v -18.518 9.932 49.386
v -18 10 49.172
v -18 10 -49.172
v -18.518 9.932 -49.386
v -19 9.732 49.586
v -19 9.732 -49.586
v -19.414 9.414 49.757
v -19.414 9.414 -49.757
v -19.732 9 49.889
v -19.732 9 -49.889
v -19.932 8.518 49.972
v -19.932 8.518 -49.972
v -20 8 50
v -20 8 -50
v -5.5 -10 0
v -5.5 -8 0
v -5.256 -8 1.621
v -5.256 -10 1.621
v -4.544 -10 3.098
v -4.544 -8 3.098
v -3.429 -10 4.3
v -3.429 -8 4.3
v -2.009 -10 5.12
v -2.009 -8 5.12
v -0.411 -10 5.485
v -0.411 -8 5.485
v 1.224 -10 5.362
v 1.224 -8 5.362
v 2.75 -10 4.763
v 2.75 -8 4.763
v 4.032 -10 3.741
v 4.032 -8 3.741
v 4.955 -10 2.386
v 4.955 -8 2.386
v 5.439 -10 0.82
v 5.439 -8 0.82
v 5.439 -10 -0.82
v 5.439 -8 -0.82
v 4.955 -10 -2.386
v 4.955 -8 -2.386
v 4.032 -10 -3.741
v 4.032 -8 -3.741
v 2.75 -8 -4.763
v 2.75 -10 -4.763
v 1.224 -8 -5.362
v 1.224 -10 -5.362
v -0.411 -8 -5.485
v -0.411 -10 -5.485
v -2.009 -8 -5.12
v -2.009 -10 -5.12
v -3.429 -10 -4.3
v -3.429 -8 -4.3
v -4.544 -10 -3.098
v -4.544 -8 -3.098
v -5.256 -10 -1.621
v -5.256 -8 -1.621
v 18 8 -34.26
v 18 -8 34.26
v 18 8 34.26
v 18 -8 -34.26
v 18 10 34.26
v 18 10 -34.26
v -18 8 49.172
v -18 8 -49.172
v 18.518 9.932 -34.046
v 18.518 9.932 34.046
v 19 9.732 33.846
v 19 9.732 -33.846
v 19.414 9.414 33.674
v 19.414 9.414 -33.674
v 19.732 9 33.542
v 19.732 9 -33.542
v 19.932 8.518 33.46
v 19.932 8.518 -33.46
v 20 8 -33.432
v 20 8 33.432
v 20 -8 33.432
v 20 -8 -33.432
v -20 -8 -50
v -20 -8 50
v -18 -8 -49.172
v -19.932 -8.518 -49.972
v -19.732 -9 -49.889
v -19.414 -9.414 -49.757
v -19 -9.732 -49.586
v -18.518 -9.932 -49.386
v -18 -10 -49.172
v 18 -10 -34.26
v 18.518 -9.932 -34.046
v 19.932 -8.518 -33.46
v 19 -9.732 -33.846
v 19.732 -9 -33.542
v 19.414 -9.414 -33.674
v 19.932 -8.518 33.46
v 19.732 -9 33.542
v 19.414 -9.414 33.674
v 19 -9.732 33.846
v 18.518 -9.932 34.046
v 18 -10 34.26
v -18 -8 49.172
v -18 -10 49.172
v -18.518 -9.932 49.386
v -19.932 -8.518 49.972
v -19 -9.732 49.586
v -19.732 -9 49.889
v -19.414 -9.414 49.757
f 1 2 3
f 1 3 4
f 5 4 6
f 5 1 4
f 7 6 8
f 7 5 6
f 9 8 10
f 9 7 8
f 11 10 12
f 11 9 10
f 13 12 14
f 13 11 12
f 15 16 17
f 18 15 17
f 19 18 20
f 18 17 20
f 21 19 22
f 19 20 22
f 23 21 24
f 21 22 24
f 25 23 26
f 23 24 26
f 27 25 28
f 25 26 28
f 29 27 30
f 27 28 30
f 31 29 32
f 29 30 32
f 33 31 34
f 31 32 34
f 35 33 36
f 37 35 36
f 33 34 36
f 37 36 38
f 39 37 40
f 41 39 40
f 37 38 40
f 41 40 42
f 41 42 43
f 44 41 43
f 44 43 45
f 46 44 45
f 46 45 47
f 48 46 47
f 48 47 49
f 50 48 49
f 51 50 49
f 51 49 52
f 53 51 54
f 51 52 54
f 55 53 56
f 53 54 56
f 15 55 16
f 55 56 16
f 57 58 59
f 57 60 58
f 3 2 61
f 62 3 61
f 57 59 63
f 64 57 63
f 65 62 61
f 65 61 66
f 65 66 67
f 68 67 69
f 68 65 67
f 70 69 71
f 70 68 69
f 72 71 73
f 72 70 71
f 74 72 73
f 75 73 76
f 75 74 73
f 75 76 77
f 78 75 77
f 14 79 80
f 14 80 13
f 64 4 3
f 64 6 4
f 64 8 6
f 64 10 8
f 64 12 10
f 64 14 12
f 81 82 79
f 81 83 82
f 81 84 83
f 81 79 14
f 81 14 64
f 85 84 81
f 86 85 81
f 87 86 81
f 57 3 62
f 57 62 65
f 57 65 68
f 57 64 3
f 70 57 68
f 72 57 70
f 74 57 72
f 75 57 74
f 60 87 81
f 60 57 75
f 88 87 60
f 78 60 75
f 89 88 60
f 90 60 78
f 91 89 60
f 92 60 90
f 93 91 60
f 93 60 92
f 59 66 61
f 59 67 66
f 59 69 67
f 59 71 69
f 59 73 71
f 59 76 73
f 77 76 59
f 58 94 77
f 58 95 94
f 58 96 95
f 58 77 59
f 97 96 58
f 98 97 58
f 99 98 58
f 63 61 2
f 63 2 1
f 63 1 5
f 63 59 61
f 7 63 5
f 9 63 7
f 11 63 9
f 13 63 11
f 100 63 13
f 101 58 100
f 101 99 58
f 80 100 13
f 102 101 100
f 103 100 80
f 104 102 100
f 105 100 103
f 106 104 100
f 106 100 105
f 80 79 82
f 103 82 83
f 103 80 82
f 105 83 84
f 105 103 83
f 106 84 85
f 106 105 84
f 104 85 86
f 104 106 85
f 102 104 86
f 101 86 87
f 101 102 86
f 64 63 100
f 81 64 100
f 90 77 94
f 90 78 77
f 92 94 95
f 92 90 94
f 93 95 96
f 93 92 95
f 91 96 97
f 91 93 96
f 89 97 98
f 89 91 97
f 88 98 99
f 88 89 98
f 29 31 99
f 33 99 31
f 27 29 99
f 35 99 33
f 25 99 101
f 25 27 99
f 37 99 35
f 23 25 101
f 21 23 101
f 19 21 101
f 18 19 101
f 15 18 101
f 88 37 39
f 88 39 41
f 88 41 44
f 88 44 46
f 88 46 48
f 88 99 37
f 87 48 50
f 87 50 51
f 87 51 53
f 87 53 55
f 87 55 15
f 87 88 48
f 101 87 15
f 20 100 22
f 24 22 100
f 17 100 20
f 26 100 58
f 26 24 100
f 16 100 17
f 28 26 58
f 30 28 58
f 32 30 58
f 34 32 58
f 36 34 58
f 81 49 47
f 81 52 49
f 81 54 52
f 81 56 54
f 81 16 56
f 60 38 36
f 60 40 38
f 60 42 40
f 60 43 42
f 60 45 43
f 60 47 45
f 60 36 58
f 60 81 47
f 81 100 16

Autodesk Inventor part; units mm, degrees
ref_plane "YZ Plane" through (0, 0, 0) normal (1, 0, 0) x (0, 1, 0)
ref_plane "XZ Plane" through (0, 0, 0) normal (0, 1, 0) x (-1, 0, 0)
ref_plane "XY Plane" through (0, 0, 0) normal (0, 0, 1) x (1, 0, 0)
sketch "Sketch1" plane through (0, 0, 0) normal (0, 0, 1) x (1, 0, 0)
  line L0 (-20, 10) -> (20, 10)
  line L1 (20, 10) -> (20, -10)
  line L2 (20, -10) -> (-20, -10)
  line L3 (-20, -10) -> (-20, 10)
  line L4 (-20, 10) -> (20, -10) construction
  line L5 (20, 10) -> (-20, -10) construction
  line L6 (18, 8) -> (-18, 8)
  line L7 (-18, 8) -> (-18, -8)
  line L8 (-18, -8) -> (18, -8)
  line L9 (18, -8) -> (18, 8)
  point P0 (0, 0)
  dimension "d0" = 40
  dimension "d1" = 20
  dimension "d2" = 2
extrude "Extrusion1" add sketch "Sketch1" along normal mid plane 100
sketch "Sketch2" plane through (0, 0, 0) normal (0, 1, 0) x (-1, 0, 0)
  line L0 (20, -50) -> (20, 50) projected
  line L1 (-20, 50) -> (20, 50)
  line L2 (-20, -50) -> (-20, 50) projected
  line L3 (20, -50) -> (-20, -50) projected
  line L4 (20, -50) -> (-20, -33.4315)
  line L5 (-20, -50) -> (-20, 50) projected
  point P0 (0, 0)
  dimension "d20" = 22.5
extrude "Extrusion2" cut sketch "Sketch2" along normal through all both and the other way through all contours L3 L2 L4
mirror "Mirror1" about plane through (0, 0, 0) normal (0, 0, 1) of "Extrusion2"
fillet "Fillet1" radius 2 4 edges at (-20, 10, 0) (-20, -10, 0) (20, -10, 0) (20, 10, 0)
sketch "Sketch4" plane through (0, 0, 0) normal (0, 1, 0) x (-1, 0, 0)
  circle A0 centre (0, 0) radius 5.5
  dimension "d21" = 11
extrude "Extrusion4" cut sketch "Sketch4" against normal through all
properties part number "Short tube 2"
